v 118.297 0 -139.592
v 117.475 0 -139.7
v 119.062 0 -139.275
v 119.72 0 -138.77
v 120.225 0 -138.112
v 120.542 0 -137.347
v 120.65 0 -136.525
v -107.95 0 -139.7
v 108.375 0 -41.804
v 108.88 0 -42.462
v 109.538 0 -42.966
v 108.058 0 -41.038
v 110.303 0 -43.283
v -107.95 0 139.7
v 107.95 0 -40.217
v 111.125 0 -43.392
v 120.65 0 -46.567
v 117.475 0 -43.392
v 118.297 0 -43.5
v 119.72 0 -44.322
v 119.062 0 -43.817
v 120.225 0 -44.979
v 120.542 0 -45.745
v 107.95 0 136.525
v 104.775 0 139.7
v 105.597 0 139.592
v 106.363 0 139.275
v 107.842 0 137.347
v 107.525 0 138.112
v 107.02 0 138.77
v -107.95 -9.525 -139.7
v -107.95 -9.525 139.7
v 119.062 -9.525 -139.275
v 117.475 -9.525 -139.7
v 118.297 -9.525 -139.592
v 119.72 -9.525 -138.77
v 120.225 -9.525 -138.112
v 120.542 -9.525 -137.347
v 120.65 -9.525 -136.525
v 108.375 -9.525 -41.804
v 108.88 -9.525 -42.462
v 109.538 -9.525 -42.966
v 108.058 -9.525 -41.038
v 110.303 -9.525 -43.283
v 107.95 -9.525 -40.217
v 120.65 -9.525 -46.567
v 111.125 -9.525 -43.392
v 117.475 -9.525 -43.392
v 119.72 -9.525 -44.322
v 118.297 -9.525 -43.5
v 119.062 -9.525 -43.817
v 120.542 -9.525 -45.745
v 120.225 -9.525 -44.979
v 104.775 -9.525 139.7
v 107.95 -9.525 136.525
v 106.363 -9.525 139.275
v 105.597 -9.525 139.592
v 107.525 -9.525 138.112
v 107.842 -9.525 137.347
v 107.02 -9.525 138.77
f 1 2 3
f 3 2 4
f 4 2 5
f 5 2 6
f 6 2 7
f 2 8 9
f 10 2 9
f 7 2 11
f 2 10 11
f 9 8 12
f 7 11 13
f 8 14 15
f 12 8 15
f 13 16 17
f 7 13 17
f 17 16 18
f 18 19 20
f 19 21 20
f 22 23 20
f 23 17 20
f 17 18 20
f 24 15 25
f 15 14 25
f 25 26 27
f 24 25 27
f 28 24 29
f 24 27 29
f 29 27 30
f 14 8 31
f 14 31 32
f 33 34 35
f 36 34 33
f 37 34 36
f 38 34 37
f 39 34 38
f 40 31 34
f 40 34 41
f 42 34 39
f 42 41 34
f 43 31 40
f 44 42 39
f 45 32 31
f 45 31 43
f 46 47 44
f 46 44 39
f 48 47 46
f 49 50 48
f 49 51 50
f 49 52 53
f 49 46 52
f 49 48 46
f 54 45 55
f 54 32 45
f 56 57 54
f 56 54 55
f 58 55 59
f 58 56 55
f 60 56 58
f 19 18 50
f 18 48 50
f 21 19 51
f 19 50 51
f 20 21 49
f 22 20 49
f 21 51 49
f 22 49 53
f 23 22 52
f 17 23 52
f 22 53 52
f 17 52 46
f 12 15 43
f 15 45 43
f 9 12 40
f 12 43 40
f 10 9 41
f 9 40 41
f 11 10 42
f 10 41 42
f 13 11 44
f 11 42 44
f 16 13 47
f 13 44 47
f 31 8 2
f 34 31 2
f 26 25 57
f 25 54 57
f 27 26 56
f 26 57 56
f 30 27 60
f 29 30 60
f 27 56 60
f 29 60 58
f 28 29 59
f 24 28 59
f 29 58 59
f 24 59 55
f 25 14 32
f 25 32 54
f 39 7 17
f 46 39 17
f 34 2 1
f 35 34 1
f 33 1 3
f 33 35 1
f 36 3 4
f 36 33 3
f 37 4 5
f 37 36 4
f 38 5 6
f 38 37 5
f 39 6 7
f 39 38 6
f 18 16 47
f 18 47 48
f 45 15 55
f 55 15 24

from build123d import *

# Parameters (mm, degrees)
F0_W     = 215.9
F0_H     = 279.4
F1_DEPTH = 9.525
F2_W     = 12.7
F2_H     = 96.3083333333
F3_DEPTH = 9.525
F4_R     = 3.175


with BuildPart() as f1:
    # F0 (on Front) → F1 (new body)
    with BuildSketch(Plane.XZ):
        Rectangle(F0_W, F0_H)
    extrude(amount=F1_DEPTH)

    # F2 (on Front) → F3 (join, through all)
    with BuildSketch(Plane.XZ):
        with Locations((114.3, -91.5458333333)):
            Rectangle(F2_W, F2_H)
    extrude(amount=F3_DEPTH)

    # F4
    f4_edges = [f1.edges().sort_by_distance(p)[0] for p in [
        (107.95, -4.7625, 139.7),
        (107.95, -4.7625, -43.391667),
        (120.65, -4.7625, -43.391667),
        (120.65, -4.7625, -139.7),
    ]]
    fillet(f4_edges, radius=F4_R)


solid = f1.part
